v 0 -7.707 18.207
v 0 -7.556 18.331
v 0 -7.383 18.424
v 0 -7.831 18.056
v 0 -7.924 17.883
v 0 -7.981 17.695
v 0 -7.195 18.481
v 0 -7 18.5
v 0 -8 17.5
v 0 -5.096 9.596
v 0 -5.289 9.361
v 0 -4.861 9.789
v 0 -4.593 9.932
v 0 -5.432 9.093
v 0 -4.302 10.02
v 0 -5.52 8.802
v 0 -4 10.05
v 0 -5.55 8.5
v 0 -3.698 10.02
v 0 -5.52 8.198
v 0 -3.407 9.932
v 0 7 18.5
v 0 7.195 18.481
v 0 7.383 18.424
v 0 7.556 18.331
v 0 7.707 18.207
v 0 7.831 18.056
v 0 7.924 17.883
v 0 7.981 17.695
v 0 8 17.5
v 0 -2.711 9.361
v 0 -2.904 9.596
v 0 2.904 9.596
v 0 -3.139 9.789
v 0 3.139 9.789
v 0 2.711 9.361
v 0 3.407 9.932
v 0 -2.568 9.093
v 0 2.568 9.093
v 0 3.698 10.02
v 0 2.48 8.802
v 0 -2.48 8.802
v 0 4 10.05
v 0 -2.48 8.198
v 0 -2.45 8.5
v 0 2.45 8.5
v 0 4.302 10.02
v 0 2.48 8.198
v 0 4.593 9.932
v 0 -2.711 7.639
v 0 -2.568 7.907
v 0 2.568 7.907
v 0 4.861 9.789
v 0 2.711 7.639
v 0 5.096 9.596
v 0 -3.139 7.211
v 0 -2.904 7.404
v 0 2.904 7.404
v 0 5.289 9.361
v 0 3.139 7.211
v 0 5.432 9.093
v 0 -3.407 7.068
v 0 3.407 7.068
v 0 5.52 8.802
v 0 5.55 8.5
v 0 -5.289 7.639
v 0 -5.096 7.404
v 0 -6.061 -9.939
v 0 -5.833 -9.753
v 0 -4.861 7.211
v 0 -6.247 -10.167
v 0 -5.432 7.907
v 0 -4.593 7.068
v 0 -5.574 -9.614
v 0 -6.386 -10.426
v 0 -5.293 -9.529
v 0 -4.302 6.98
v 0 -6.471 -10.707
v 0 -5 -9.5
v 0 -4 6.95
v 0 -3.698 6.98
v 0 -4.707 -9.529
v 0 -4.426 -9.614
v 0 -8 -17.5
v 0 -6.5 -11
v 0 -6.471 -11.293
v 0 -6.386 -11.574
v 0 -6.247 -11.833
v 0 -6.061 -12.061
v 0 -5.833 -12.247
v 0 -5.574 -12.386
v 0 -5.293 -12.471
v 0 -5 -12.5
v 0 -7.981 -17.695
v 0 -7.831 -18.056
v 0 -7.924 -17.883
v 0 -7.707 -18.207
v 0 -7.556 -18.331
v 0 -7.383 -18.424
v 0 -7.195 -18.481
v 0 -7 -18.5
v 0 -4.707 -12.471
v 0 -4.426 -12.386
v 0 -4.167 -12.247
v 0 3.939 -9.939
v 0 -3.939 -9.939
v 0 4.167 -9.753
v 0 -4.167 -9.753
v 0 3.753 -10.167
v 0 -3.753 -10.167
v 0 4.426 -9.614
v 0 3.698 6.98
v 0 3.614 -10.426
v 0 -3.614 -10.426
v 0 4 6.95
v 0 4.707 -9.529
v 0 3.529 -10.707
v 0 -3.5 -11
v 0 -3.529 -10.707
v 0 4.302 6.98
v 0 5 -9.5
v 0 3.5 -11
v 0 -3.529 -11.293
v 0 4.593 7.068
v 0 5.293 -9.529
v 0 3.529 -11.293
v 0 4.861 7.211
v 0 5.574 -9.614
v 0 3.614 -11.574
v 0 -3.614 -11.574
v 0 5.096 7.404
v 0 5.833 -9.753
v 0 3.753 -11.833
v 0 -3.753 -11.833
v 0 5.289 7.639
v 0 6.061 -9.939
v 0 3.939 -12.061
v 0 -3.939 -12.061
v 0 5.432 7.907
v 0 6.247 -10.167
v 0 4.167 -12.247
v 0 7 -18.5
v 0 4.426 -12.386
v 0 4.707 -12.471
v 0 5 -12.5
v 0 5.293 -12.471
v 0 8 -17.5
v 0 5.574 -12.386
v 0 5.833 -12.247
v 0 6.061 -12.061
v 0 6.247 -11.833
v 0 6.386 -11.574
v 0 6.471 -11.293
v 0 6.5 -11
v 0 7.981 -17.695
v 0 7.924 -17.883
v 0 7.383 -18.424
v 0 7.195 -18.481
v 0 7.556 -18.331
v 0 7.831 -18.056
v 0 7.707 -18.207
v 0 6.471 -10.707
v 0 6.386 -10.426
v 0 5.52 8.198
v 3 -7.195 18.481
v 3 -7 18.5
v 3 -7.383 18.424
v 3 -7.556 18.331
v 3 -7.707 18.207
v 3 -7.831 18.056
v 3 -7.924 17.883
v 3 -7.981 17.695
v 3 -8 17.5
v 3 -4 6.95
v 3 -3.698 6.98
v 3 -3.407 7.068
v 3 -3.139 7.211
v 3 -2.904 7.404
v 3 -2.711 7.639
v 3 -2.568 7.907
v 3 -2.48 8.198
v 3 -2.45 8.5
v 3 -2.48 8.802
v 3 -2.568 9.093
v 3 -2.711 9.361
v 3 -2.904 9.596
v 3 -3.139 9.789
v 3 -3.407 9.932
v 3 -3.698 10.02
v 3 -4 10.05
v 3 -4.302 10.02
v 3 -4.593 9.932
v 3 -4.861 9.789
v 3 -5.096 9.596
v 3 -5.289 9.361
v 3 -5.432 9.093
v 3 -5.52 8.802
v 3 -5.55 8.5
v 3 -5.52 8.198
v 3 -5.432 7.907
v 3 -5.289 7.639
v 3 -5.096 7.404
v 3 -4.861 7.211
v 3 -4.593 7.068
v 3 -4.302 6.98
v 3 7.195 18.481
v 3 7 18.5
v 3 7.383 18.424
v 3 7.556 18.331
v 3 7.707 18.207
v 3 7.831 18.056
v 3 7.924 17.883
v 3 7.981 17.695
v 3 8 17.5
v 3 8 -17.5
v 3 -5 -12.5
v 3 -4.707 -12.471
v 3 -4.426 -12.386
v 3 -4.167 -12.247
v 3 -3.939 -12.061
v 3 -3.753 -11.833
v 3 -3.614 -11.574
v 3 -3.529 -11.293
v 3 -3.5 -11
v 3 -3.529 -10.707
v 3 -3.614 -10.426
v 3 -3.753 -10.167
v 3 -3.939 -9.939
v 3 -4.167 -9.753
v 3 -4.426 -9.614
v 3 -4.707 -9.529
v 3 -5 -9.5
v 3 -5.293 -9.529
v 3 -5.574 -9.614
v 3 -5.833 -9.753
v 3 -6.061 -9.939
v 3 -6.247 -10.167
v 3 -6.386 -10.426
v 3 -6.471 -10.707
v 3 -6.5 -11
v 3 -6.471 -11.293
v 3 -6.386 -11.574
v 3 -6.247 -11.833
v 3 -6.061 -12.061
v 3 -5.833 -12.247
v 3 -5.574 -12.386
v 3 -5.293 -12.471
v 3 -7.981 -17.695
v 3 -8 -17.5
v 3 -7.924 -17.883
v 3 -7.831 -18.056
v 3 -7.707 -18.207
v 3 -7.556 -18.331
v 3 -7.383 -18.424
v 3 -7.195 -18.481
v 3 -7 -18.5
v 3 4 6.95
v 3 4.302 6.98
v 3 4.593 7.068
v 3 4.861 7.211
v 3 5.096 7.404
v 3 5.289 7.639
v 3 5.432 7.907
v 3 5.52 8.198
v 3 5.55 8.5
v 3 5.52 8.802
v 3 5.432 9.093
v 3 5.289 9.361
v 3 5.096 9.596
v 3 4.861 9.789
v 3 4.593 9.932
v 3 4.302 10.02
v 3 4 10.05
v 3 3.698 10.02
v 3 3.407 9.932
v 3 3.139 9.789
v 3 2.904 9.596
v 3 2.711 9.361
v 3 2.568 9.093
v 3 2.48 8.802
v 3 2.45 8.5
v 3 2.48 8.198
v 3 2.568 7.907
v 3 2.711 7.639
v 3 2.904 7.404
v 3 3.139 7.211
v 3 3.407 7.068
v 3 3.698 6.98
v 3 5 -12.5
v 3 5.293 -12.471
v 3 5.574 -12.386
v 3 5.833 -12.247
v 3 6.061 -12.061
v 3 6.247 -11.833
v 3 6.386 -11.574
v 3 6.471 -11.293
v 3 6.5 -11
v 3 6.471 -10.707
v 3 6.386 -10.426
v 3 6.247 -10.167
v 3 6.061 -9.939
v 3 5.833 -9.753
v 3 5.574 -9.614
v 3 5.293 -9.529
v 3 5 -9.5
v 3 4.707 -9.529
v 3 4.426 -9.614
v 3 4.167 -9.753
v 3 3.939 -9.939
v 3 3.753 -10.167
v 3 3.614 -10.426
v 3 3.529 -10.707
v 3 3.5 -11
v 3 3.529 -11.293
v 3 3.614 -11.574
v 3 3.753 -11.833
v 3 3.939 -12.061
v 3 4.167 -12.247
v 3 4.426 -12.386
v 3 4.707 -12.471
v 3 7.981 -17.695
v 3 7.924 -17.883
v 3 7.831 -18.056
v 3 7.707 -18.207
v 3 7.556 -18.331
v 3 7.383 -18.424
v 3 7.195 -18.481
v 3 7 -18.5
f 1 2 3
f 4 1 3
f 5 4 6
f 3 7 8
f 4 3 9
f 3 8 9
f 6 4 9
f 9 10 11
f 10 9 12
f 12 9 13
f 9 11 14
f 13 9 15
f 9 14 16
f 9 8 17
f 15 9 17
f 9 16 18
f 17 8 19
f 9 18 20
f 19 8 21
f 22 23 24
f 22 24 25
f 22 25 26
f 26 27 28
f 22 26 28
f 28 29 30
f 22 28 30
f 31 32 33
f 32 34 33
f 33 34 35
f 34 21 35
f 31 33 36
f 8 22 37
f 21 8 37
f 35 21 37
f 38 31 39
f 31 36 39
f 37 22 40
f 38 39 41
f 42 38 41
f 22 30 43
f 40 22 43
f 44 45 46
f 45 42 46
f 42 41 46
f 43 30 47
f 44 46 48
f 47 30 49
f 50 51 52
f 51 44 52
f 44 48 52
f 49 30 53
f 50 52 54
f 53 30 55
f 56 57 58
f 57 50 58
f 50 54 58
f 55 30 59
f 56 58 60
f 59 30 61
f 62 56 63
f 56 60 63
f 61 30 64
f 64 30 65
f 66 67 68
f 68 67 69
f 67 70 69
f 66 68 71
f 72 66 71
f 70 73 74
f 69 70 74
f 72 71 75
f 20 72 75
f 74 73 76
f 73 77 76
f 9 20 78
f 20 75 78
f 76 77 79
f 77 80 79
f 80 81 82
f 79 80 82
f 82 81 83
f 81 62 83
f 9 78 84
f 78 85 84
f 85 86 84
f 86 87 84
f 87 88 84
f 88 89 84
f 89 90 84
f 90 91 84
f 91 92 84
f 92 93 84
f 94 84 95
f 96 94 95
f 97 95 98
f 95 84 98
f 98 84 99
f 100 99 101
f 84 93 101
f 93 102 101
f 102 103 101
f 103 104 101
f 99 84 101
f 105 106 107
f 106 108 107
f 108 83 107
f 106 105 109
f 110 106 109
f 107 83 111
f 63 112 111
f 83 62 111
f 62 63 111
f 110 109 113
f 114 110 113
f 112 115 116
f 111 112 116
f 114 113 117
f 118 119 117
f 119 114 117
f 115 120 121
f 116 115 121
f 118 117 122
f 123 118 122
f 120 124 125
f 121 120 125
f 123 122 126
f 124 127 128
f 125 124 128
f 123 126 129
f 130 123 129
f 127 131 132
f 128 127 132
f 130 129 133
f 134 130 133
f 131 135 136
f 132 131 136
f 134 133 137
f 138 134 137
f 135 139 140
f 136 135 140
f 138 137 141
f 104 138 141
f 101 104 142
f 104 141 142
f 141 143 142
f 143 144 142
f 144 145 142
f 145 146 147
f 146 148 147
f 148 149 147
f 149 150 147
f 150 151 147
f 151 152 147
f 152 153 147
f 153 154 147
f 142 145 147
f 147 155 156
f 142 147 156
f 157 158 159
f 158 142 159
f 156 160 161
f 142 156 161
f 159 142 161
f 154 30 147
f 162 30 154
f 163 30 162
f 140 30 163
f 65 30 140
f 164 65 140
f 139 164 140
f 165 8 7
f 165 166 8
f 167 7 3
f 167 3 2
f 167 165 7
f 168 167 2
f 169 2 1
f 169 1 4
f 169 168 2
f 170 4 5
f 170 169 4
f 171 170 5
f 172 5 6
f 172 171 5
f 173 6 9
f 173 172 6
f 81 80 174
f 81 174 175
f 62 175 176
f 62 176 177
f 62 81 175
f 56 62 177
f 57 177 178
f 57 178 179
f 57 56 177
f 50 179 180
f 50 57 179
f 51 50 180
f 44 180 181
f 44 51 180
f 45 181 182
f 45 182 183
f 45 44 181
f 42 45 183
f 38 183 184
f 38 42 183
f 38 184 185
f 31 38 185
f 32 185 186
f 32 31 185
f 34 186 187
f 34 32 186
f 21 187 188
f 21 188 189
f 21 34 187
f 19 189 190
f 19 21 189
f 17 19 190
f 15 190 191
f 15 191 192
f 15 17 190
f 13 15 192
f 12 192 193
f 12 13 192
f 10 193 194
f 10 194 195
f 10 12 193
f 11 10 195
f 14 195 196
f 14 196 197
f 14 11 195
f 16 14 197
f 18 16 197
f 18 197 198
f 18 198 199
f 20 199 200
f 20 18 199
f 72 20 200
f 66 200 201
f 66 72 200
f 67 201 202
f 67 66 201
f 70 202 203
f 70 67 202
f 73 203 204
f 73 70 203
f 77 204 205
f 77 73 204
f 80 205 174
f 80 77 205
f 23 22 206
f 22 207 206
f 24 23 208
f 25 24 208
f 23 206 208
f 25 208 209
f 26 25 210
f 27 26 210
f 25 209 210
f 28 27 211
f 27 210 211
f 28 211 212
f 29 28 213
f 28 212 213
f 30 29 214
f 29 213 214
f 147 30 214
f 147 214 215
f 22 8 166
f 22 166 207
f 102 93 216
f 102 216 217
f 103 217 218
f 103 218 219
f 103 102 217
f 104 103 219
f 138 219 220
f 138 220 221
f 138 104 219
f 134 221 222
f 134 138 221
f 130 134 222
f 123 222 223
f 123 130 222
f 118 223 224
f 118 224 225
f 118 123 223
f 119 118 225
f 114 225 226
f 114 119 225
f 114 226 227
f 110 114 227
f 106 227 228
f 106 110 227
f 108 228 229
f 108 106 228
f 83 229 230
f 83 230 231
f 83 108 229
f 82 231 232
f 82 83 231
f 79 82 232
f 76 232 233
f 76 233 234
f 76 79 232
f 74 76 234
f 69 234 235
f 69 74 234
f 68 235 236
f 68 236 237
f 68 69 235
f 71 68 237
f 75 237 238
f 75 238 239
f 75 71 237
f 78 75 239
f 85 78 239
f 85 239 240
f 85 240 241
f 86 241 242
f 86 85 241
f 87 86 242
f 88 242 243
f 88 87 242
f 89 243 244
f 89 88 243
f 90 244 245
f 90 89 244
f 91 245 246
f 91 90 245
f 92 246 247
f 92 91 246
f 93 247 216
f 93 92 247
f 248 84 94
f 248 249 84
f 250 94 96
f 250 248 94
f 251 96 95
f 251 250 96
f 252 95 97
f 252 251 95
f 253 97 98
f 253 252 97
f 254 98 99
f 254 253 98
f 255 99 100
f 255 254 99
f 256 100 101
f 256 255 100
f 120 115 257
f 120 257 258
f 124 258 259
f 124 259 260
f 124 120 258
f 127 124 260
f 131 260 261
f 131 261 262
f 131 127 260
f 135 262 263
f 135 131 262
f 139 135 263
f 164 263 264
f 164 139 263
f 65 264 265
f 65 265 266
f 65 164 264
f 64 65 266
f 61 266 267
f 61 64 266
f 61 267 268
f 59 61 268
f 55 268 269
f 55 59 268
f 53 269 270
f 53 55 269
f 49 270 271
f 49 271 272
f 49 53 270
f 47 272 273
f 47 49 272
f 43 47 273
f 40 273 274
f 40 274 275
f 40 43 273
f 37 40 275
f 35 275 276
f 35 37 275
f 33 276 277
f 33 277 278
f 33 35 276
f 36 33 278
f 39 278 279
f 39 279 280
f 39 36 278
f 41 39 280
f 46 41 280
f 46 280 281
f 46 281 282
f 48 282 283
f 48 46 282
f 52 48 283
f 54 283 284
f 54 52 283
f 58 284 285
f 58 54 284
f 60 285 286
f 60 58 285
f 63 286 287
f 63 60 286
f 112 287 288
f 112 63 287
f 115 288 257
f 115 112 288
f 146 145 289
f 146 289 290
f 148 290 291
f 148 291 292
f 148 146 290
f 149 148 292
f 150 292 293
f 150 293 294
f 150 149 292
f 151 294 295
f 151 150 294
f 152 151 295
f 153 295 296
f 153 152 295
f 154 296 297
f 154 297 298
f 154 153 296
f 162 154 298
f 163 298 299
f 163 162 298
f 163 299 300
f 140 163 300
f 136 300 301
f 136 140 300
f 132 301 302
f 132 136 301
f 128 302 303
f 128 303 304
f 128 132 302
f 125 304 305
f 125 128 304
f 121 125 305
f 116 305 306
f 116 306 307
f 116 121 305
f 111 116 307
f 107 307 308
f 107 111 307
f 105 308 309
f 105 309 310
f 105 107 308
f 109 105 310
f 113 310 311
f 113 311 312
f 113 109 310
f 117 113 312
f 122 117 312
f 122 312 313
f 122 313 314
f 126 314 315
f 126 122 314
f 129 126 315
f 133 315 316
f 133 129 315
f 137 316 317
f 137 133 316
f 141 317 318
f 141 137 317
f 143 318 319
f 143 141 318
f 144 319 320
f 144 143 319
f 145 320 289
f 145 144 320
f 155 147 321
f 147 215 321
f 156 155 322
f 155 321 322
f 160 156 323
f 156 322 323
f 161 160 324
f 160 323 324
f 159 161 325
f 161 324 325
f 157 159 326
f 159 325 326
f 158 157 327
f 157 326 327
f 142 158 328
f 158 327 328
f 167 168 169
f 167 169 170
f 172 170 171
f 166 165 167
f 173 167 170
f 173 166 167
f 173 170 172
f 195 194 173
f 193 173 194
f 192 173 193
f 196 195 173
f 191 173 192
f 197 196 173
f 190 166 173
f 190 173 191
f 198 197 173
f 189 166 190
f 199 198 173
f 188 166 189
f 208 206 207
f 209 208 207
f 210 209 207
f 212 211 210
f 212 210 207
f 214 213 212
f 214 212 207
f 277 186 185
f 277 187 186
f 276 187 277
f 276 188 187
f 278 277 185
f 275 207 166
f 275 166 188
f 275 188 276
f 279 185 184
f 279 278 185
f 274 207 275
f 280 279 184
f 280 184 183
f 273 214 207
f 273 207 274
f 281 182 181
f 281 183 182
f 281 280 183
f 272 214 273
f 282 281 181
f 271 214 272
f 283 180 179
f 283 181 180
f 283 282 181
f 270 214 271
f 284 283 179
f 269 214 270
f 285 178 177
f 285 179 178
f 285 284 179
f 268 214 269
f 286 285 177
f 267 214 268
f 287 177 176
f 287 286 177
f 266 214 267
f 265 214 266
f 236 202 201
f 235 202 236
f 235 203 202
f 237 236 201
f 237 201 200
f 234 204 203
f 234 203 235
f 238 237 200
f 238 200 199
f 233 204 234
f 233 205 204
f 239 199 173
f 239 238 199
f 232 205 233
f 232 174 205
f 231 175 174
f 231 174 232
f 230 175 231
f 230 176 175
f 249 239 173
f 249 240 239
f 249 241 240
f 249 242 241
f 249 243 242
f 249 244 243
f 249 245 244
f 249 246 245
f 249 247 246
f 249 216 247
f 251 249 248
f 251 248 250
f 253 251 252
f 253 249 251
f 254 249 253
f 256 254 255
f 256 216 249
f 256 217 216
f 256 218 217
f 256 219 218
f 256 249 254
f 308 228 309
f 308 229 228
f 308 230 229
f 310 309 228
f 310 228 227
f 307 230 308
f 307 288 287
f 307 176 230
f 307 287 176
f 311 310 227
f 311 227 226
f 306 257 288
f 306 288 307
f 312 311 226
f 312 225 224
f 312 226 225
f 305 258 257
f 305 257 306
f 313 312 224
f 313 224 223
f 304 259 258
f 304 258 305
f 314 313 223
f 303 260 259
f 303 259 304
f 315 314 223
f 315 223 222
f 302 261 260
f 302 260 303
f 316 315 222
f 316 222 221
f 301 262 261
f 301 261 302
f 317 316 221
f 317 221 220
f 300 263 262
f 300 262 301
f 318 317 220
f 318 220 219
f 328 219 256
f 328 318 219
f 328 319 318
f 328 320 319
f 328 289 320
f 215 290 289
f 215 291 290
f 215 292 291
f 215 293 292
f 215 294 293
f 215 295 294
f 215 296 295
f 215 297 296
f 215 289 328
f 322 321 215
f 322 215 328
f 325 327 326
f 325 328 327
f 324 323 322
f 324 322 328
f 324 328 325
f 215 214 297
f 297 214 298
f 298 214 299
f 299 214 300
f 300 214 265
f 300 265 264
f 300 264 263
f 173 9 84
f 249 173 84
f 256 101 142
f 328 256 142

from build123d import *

# Parameters (mm, degrees)
SKETCH_1_W      = 37
SKETCH_1_H      = 16
SKETCH_1_R      = 1.5
SKETCH_1_R_2    = 1.55
EXTRUDE_1_DEPTH = 3
FILLET_1_R      = 1


with BuildPart() as part:
    # 草图1 → 凸台-拉伸1 (new body)
    with BuildSketch(Plane(origin=(0, 0, 0), x_dir=(0, 0, -1), z_dir=(1, 0, 0))):
        Rectangle(SKETCH_1_W, SKETCH_1_H)
        with Locations((11, 5)):
            Circle(SKETCH_1_R, mode=Mode.SUBTRACT)
        with Locations((11, -5)):
            Circle(SKETCH_1_R, mode=Mode.SUBTRACT)
        with Locations((-8.5, 4)):
            Circle(SKETCH_1_R_2, mode=Mode.SUBTRACT)
        with Locations((-8.5, -4)):
            Circle(SKETCH_1_R_2, mode=Mode.SUBTRACT)
    extrude(amount=EXTRUDE_1_DEPTH)

    # 圆角1
    fillet_1_edges = [part.edges().sort_by_distance(p)[0] for p in [
        (1.5, 8, 18.5),
        (1.5, 8, -18.5),
        (1.5, -8, -18.5),
        (1.5, -8, 18.5),
    ]]
    fillet(fillet_1_edges, radius=FILLET_1_R)


solid = part.part
